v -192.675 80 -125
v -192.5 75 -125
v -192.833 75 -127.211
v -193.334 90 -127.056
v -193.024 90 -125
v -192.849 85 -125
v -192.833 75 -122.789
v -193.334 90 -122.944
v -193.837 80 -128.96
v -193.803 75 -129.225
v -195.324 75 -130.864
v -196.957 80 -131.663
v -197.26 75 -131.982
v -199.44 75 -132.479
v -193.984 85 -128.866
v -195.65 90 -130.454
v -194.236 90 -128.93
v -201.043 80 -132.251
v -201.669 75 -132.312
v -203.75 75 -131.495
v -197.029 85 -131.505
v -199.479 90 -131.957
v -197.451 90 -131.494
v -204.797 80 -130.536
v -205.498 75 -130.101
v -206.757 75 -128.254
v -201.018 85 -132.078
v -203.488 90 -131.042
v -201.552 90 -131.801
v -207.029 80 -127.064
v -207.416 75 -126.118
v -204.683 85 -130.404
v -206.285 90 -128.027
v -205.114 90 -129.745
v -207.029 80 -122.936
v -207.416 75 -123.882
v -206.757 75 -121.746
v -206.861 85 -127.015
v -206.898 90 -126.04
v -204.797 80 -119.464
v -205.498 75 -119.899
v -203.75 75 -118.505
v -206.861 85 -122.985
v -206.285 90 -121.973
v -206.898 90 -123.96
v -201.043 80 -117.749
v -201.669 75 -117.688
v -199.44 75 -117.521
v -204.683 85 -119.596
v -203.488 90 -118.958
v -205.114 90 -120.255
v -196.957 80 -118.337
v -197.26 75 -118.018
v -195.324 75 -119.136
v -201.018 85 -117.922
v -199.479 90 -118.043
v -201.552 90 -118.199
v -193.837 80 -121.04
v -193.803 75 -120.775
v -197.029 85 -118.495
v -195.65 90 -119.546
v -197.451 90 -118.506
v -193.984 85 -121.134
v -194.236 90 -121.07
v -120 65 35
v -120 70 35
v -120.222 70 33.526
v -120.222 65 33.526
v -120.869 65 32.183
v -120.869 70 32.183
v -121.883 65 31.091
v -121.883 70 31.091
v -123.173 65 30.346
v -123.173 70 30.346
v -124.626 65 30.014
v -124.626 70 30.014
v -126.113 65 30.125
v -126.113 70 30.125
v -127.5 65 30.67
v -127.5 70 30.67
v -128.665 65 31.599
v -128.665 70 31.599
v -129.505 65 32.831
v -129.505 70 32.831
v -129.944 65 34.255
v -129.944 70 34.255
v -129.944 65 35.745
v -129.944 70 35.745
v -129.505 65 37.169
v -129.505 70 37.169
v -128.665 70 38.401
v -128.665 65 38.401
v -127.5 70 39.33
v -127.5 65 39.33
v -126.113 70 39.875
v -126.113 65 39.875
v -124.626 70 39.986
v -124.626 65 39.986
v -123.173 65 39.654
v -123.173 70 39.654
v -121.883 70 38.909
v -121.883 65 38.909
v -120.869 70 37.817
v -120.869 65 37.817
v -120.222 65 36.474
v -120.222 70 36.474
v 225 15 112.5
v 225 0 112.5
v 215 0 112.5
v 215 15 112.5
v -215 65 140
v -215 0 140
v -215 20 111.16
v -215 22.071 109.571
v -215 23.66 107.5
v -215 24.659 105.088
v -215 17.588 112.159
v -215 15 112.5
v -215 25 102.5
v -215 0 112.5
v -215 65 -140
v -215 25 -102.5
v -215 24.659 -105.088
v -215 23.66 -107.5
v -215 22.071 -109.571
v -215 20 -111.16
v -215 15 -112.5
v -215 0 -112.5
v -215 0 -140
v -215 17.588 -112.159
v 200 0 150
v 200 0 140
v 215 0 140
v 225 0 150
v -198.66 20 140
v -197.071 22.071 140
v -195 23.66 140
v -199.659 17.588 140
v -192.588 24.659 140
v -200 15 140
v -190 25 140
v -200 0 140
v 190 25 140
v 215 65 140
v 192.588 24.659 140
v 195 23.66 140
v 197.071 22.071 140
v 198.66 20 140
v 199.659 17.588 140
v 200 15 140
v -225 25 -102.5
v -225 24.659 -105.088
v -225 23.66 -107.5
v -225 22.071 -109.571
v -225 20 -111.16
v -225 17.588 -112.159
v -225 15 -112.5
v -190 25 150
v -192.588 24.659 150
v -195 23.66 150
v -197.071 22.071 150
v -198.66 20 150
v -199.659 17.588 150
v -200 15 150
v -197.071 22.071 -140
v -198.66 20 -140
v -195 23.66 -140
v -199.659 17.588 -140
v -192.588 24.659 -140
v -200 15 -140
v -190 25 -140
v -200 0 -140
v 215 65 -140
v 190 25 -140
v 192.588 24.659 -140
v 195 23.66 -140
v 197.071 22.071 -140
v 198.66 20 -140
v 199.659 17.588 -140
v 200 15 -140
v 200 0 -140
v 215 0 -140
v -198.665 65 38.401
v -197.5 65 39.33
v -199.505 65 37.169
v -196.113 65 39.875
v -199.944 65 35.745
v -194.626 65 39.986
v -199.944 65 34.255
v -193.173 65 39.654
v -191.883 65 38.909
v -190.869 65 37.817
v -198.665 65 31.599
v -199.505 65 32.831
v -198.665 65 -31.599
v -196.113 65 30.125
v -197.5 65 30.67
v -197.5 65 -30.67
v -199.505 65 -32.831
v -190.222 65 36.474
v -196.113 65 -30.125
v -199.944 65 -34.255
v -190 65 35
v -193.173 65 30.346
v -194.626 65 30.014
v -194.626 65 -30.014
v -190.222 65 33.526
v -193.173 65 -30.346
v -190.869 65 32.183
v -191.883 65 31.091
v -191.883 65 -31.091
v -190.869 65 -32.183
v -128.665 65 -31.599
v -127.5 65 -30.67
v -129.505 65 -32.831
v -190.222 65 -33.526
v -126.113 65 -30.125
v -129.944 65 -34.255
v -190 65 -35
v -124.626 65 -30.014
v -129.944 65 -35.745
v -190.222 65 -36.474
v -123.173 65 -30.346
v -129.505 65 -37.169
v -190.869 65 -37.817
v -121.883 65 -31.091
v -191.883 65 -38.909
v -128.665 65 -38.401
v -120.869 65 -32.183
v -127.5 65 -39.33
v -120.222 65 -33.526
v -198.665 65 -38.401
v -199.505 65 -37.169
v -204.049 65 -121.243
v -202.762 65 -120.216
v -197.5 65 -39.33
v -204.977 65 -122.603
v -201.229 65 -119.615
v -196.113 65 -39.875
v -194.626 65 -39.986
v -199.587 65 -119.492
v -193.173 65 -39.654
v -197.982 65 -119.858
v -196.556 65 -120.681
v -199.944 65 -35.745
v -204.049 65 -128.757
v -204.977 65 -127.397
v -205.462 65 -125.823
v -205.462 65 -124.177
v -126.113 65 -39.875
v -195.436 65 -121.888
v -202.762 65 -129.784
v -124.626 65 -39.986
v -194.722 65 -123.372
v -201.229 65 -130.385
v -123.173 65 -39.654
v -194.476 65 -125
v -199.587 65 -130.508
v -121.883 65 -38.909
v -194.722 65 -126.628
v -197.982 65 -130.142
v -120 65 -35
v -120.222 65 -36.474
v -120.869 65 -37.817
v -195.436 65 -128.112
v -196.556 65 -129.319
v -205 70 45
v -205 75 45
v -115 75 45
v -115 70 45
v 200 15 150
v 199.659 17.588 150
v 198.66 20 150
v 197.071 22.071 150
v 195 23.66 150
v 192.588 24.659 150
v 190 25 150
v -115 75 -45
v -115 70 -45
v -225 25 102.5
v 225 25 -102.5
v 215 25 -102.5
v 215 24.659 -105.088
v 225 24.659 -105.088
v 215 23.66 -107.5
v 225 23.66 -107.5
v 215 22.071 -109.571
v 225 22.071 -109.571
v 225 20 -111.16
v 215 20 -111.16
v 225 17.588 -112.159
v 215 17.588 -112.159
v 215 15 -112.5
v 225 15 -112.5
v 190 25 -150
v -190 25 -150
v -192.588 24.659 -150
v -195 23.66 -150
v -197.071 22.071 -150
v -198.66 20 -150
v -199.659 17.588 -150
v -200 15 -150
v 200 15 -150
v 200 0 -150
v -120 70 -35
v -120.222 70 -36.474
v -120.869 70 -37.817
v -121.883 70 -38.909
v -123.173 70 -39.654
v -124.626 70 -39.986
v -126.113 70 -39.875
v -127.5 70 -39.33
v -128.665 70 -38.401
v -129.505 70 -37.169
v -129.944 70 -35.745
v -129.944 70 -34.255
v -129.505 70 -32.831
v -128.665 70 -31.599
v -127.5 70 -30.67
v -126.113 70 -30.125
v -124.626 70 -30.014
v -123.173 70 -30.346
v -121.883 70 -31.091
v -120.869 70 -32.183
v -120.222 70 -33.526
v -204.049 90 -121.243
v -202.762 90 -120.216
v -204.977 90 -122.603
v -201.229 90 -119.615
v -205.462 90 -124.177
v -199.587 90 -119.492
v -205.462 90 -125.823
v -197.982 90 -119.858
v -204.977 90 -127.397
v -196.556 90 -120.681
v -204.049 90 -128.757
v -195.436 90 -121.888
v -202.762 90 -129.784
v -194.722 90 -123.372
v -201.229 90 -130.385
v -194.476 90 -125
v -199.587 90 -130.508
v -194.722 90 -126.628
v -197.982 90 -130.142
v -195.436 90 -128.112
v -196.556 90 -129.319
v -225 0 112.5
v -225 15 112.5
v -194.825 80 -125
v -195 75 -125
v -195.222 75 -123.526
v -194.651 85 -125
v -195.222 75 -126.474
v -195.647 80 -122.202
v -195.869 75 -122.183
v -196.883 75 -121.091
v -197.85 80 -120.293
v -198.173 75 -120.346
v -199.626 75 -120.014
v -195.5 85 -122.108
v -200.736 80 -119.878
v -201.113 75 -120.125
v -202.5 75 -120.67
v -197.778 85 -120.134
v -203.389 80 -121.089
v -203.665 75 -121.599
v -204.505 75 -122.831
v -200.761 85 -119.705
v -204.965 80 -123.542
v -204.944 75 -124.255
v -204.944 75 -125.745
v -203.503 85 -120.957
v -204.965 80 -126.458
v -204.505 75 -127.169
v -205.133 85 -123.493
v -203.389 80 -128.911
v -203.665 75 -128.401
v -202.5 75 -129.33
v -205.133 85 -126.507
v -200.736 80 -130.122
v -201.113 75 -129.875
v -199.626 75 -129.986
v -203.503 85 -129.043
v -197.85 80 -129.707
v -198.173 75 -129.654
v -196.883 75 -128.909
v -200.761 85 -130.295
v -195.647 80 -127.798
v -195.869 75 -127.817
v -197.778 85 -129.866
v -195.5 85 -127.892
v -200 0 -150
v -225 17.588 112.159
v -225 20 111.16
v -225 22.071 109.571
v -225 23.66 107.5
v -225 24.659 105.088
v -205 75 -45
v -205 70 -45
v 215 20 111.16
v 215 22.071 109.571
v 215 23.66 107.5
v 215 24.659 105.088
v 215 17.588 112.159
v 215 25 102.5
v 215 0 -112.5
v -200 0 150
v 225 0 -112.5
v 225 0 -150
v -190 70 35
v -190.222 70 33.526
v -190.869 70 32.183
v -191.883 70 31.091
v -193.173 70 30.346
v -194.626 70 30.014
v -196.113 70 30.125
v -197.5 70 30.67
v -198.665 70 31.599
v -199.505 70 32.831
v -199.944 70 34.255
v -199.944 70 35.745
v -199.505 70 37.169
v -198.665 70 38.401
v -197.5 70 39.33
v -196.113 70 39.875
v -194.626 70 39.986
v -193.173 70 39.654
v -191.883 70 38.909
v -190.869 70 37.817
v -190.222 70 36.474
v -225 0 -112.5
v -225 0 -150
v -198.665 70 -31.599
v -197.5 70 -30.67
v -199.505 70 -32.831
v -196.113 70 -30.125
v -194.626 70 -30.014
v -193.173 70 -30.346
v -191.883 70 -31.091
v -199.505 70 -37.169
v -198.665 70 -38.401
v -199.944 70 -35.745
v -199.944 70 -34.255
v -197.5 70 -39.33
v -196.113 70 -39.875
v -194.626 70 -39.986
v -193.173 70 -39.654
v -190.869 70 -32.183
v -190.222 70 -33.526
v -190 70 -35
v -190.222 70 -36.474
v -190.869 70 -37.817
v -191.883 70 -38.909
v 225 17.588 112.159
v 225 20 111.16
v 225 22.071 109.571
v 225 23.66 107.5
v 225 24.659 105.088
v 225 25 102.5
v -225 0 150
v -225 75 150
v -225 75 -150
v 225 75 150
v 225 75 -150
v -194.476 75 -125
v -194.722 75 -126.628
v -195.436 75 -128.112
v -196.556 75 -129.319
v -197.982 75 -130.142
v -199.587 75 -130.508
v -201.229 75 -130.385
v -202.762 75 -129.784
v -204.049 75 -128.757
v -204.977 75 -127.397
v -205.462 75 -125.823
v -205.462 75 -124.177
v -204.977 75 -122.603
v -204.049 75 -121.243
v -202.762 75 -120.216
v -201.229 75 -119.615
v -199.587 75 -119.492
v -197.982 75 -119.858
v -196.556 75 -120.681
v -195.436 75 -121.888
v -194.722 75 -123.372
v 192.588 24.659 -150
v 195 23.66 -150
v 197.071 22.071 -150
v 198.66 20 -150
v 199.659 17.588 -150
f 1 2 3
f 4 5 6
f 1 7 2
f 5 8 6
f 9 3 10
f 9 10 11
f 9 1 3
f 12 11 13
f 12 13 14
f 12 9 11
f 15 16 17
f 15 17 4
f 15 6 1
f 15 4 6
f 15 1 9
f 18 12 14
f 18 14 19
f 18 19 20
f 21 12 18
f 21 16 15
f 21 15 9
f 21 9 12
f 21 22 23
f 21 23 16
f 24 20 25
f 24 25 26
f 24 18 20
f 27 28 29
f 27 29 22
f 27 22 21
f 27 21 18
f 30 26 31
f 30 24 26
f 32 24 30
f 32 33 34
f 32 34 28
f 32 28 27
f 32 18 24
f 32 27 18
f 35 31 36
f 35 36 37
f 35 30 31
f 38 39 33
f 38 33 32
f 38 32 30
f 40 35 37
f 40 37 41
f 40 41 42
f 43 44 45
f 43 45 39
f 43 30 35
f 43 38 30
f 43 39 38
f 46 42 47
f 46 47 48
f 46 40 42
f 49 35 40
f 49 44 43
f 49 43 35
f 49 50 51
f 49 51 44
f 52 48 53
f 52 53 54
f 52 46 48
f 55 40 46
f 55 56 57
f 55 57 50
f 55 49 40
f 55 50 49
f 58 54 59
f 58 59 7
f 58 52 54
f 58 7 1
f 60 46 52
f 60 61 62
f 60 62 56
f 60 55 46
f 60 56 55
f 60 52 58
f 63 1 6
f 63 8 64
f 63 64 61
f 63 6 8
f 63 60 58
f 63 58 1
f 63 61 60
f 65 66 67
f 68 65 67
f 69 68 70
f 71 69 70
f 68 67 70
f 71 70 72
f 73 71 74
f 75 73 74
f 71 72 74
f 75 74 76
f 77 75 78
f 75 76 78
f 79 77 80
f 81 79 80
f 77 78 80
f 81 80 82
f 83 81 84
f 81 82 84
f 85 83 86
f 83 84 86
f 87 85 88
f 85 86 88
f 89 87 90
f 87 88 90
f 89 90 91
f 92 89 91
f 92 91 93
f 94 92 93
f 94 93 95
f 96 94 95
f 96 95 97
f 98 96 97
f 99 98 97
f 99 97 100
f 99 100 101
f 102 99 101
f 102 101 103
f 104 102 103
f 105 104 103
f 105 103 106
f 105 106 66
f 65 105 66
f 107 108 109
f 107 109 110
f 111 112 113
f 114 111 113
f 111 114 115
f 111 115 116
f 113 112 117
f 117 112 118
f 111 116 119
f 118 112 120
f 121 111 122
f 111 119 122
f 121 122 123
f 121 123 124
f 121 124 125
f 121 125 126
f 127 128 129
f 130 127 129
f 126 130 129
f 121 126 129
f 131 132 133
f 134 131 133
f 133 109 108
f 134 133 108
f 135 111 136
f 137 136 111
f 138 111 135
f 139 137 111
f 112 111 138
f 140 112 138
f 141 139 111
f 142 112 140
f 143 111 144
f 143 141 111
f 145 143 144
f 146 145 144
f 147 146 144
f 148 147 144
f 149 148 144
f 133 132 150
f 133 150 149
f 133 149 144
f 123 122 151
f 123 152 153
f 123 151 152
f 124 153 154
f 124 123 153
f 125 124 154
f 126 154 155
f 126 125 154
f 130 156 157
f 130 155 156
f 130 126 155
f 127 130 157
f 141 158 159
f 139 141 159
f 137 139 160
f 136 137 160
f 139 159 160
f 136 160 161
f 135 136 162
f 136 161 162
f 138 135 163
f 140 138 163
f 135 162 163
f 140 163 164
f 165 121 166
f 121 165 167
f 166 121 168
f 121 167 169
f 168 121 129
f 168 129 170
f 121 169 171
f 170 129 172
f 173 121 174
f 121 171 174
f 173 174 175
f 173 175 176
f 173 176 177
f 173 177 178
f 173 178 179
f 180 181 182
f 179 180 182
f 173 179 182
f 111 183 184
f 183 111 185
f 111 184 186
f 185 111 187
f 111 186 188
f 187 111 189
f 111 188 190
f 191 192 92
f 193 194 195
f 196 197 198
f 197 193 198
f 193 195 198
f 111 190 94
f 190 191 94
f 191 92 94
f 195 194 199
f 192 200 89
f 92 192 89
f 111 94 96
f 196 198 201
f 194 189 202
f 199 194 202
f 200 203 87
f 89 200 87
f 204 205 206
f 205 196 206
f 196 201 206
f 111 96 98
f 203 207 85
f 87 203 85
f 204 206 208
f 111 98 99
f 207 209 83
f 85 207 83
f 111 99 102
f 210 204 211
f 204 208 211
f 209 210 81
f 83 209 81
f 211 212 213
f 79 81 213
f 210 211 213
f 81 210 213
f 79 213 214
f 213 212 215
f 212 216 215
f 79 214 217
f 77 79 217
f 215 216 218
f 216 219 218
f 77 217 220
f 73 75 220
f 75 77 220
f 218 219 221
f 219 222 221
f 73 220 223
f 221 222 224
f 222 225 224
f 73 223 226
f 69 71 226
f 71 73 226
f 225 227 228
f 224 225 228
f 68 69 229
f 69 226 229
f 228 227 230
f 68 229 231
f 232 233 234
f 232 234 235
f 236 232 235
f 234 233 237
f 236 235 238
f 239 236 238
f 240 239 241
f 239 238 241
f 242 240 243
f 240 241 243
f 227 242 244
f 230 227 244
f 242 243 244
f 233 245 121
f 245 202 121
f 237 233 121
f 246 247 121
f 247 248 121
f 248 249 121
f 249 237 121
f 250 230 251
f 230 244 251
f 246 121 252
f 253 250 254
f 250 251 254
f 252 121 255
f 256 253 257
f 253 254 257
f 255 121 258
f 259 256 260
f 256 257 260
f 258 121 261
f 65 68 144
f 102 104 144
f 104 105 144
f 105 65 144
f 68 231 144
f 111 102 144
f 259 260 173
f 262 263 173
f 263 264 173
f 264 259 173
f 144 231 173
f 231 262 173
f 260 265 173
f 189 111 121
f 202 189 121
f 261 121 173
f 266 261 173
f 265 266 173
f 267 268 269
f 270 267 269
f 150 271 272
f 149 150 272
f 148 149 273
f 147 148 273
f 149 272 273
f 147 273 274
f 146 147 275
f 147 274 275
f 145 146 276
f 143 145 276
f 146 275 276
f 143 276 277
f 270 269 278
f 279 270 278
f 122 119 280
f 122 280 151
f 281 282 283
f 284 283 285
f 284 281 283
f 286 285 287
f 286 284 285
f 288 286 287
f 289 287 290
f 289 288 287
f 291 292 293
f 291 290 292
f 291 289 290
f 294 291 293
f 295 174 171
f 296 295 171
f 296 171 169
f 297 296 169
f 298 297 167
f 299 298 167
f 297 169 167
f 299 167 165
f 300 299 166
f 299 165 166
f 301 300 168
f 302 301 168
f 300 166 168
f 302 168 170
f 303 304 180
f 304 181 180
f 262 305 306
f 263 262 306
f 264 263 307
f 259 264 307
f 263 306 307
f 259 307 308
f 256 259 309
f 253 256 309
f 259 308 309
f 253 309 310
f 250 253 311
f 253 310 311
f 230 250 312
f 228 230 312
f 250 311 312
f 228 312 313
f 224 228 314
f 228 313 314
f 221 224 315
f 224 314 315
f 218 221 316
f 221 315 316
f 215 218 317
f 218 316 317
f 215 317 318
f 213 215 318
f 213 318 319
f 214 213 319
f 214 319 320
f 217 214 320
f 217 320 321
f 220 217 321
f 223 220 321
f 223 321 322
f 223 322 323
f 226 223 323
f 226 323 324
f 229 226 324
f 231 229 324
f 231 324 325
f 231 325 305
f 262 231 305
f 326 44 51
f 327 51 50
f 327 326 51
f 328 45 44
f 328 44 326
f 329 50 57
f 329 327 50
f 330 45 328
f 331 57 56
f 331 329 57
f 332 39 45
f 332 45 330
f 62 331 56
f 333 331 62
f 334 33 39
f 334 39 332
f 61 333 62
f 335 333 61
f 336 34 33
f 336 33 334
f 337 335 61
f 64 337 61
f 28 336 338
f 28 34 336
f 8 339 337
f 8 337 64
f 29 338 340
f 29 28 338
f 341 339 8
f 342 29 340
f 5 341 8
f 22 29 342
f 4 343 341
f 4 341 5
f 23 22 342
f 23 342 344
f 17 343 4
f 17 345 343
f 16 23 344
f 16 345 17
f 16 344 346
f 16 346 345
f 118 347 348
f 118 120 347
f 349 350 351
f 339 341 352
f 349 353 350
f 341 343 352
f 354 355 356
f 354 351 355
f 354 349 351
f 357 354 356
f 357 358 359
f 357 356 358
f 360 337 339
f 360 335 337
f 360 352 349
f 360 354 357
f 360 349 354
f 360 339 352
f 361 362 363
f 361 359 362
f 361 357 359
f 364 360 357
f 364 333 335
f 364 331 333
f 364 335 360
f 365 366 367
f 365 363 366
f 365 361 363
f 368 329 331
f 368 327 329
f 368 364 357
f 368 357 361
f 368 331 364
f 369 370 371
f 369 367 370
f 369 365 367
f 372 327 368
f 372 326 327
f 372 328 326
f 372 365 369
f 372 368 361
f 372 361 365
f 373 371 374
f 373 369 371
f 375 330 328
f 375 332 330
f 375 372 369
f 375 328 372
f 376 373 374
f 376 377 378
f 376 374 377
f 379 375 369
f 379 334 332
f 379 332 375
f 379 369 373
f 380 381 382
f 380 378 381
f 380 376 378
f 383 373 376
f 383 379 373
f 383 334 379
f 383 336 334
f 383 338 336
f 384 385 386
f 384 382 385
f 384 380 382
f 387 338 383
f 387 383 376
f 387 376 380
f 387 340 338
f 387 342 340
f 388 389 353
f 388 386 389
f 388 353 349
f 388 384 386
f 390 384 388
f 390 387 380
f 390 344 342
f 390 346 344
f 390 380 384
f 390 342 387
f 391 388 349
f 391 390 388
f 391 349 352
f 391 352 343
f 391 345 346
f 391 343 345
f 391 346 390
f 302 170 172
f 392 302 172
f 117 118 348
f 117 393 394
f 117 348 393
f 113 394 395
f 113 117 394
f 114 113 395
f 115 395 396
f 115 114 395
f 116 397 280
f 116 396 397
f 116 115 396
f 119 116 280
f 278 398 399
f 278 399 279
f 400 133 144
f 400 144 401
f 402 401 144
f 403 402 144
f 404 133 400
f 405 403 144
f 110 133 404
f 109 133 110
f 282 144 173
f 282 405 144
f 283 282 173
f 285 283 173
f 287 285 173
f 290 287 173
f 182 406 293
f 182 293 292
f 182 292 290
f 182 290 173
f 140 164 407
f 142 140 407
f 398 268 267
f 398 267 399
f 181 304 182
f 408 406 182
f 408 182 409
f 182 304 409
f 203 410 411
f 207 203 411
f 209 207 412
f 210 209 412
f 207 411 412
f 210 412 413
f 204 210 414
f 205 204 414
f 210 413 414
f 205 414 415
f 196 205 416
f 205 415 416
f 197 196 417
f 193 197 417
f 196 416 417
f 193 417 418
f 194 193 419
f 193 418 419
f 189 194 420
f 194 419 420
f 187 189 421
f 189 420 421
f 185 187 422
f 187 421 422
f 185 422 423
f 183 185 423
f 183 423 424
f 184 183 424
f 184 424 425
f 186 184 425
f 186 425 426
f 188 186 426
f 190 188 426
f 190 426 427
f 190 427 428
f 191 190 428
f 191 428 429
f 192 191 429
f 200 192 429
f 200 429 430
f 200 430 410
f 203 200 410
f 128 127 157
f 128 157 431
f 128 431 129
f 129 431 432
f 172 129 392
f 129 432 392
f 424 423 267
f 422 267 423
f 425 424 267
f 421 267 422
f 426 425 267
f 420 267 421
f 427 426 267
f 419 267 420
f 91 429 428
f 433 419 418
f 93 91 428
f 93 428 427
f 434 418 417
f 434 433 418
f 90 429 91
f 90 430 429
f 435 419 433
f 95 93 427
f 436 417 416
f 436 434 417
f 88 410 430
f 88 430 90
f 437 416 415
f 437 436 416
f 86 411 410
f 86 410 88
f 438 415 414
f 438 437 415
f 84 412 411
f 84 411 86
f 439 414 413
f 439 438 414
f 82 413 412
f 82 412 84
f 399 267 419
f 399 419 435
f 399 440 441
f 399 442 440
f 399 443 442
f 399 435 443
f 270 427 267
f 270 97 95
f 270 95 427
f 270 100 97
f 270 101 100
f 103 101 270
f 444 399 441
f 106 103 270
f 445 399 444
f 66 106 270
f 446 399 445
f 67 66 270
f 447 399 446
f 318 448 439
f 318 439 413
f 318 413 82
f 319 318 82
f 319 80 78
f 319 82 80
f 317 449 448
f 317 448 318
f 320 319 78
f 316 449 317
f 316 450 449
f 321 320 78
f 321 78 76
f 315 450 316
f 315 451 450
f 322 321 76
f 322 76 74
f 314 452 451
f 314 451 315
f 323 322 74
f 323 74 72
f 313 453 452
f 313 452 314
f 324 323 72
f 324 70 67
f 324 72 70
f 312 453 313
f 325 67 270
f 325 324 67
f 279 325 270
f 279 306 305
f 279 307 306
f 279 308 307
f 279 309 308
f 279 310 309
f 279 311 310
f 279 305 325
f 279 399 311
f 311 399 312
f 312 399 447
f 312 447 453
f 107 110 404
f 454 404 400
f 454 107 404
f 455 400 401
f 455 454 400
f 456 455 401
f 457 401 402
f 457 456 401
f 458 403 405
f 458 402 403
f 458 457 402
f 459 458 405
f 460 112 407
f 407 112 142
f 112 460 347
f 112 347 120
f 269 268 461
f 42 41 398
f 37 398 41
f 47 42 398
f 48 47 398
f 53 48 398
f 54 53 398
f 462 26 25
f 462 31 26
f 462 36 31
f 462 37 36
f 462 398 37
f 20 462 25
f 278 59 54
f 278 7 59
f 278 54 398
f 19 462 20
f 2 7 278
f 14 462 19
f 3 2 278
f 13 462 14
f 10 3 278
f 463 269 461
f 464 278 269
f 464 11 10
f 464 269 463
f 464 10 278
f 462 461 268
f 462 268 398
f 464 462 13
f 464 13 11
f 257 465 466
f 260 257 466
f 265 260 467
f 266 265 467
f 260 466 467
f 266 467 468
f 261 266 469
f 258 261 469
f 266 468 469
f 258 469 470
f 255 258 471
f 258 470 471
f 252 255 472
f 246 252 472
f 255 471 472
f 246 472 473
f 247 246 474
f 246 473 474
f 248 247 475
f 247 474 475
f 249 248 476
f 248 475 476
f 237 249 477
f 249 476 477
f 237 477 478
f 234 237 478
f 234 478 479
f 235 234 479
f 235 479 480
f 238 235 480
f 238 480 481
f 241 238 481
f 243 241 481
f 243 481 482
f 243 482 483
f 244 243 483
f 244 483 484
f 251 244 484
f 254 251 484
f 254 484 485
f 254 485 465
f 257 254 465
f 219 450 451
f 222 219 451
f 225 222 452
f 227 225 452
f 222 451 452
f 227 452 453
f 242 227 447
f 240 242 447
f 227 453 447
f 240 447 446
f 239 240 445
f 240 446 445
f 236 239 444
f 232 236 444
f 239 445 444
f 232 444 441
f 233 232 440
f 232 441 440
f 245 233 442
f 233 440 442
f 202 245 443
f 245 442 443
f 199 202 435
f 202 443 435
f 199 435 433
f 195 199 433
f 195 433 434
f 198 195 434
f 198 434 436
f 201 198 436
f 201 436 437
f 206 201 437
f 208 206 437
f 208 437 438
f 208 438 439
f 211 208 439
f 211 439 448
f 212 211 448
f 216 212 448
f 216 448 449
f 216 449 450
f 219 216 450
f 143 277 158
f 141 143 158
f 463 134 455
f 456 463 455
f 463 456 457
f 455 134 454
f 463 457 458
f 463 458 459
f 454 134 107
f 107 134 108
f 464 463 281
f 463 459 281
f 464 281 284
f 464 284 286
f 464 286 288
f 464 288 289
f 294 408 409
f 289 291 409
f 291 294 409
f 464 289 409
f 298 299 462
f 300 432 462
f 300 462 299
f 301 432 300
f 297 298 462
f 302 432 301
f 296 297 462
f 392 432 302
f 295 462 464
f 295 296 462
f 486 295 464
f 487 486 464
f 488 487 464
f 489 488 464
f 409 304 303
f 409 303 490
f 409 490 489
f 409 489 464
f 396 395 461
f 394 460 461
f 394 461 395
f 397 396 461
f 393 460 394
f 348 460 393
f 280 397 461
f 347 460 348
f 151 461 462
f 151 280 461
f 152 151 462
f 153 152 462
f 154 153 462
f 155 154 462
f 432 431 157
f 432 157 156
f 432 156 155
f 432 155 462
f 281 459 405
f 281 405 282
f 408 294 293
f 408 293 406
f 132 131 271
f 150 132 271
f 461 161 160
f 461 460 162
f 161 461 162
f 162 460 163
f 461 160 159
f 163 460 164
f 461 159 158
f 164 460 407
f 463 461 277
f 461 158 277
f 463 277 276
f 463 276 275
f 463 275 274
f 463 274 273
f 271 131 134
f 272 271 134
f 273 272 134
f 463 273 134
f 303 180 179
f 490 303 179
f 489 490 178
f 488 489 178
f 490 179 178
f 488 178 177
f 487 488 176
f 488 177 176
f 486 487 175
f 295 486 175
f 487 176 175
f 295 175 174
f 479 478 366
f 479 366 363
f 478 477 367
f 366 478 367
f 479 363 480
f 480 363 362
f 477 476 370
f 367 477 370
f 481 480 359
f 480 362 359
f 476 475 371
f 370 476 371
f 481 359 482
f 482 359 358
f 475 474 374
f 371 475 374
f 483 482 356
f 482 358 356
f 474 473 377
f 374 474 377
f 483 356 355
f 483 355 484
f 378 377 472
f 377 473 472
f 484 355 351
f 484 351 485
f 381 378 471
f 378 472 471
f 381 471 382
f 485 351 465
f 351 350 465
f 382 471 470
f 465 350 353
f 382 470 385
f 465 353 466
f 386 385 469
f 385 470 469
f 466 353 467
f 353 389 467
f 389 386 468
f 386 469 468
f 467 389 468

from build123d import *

# Parameters (mm, degrees)
SKETCH1_W           = 450
SKETCH1_H           = 300
BOSS_EXTRUDE1_DEPTH = 75
SHELL1_T            = -10
CUT_EXTRUDE1_DEPTH  = 451
CUT_EXTRUDE2_DEPTH  = 301
SKETCH4_R           = 7.5
SKETCH4_R_2         = 5
BOSS_EXTRUDE2_DEPTH = 15
BOSS_EXTRUDE2_TAPER = 2
SKETCH5_R           = 5.523811542
CUT_EXTRUDE3_DEPTH  = 15
BOSS_EXTRUDE3_DEPTH = 15
SKETCH8_W           = 90
SKETCH8_H           = 90
CUT_EXTRUDE5_DEPTH  = 5
SKETCH9_R           = 5
CUT_EXTRUDE6_DEPTH  = 65
SKETCH11_W          = 280
SKETCH11_H          = 15
CUT_EXTRUDE8_DEPTH  = 271


with BuildPart() as part:
    # Sketch1 → Boss-Extrude1 (new body)
    with BuildSketch(Plane(origin=(0, 0, 0), x_dir=(1, 0, 0), z_dir=(0, 1, 0))):
        Rectangle(SKETCH1_W, SKETCH1_H)
    extrude(amount=BOSS_EXTRUDE1_DEPTH)

    # Shell1
    shell1_openings = [part.faces().sort_by_distance(p)[0] for p in [
        (0, 0, 0),
    ]]
    offset(amount=SHELL1_T, openings=shell1_openings, kind=Kind.INTERSECTION)

    # Sketch2 → Cut-Extrude1 (cut, through all)
    with BuildSketch(Plane(origin=(225, 0, 0), x_dir=(0, 0, -1), z_dir=(1, 0, 0))):
        with BuildLine():
            Line((-102.5, 25), (102.5, 25))
            ThreePointArc((102.5, 25), (109.571067812, 22.071067812), (112.5, 15))
            Line((112.5, 15), (112.5, -15))
            ThreePointArc((112.5, -15), (109.571067812, -22.071067812), (102.5, -25))
            Line((102.5, -25), (-102.5, -25))
            ThreePointArc((-102.5, -25), (-109.571067812, -22.071067812), (-112.5, -15))
            Line((-112.5, -15), (-112.5, 15))
            ThreePointArc((-112.5, 15), (-109.571067812, 22.071067812), (-102.5, 25))
        make_face()
    extrude(amount=-CUT_EXTRUDE1_DEPTH, mode=Mode.SUBTRACT)

    # Sketch3 → Cut-Extrude2 (cut, through all)
    with BuildSketch(Plane.XY.offset(150)):
        with BuildLine():
            Line((-190, -25), (190, -25))
            ThreePointArc((190, -25), (197.071067812, -22.071067812), (200, -15))
            Line((200, -15), (200, 15))
            ThreePointArc((200, 15), (197.071067812, 22.071067812), (190, 25))
            Line((190, 25), (-190, 25))
            ThreePointArc((-190, 25), (-197.071067812, 22.071067812), (-200, 15))
            Line((-200, 15), (-200, -15))
            ThreePointArc((-200, -15), (-197.071067812, -22.071067812), (-190, -25))
        make_face()
    extrude(amount=-CUT_EXTRUDE2_DEPTH, mode=Mode.SUBTRACT)

    # Sketch4 → Boss-Extrude2 (add)
    with BuildSketch(Plane(origin=(0, 75, 0), x_dir=(1, 0, 0), z_dir=(0, 1, 0))):
        with Locations((-200, 125)):
            Circle(SKETCH4_R)
        with Locations((-200, 125)):
            Circle(SKETCH4_R_2, mode=Mode.SUBTRACT)
    extrude(amount=BOSS_EXTRUDE2_DEPTH, taper=BOSS_EXTRUDE2_TAPER)

    # Sketch5 → Cut-Extrude3 (cut)
    with BuildSketch(Plane(origin=(0, 75, 0), x_dir=(1, 0, 0), z_dir=(0, 1, 0))):
        with Locations((-200, 125)):
            Circle(SKETCH5_R)
    extrude(amount=-CUT_EXTRUDE3_DEPTH, mode=Mode.SUBTRACT)

    # Sketch6 → Boss-Extrude3 (add)
    with BuildSketch(Plane(origin=(0, 75, 0), x_dir=(1, 0, 0), z_dir=(0, 1, 0))):
        with BuildLine():
            Line((-105, 120), (175, 120))
            Line((175, 120), (175, 37.5))
            ThreePointArc((175, 37.5), (137.5, 0), (175, -37.5))
            Line((175, -37.5), (175, -120))
            Line((175, -120), (-105, -120))
            Line((-105, -120), (-105, 120))
        make_face()
        Polygon((135, 80), (0, 80), (0, 105), (-65, 105), (-65, 25), (0, 25), (0, 50), (135, 50), align=None, mode=Mode.SUBTRACT)
        Polygon((135, -50), (135, -80), (0, -80), (0, -105), (-65, -105), (-65, -25), (0, -25), (0, -50), align=None, mode=Mode.SUBTRACT)
    extrude(amount=BOSS_EXTRUDE3_DEPTH)

    # Sketch8 → Cut-Extrude5 (cut)
    with BuildSketch(Plane(origin=(0, 75, 0), x_dir=(1, 0, 0), z_dir=(0, 1, 0))):
        with Locations((-160, 0)):
            Rectangle(SKETCH8_W, SKETCH8_H)
    extrude(amount=-CUT_EXTRUDE5_DEPTH, mode=Mode.SUBTRACT)

    # Sketch9 → Cut-Extrude6 (cut)
    with BuildSketch(Plane(origin=(0, 70, 0), x_dir=(1, 0, 0), z_dir=(0, 1, 0))):
        with Locations((-195, 35)):
            Circle(SKETCH9_R)
        with Locations((-125, 35)):
            Circle(SKETCH9_R)
        with Locations((-125, -35)):
            Circle(SKETCH9_R)
        with Locations((-195, -35)):
            Circle(SKETCH9_R)
    extrude(amount=-CUT_EXTRUDE6_DEPTH, mode=Mode.SUBTRACT)

    # Sketch11 → Cut-Extrude8 (cut, through all)
    with BuildSketch(Plane.XY.offset(120)):
        with Locations((35, 82.5)):
            Rectangle(SKETCH11_W, SKETCH11_H)
    extrude(amount=-CUT_EXTRUDE8_DEPTH, mode=Mode.SUBTRACT)


solid = part.part
